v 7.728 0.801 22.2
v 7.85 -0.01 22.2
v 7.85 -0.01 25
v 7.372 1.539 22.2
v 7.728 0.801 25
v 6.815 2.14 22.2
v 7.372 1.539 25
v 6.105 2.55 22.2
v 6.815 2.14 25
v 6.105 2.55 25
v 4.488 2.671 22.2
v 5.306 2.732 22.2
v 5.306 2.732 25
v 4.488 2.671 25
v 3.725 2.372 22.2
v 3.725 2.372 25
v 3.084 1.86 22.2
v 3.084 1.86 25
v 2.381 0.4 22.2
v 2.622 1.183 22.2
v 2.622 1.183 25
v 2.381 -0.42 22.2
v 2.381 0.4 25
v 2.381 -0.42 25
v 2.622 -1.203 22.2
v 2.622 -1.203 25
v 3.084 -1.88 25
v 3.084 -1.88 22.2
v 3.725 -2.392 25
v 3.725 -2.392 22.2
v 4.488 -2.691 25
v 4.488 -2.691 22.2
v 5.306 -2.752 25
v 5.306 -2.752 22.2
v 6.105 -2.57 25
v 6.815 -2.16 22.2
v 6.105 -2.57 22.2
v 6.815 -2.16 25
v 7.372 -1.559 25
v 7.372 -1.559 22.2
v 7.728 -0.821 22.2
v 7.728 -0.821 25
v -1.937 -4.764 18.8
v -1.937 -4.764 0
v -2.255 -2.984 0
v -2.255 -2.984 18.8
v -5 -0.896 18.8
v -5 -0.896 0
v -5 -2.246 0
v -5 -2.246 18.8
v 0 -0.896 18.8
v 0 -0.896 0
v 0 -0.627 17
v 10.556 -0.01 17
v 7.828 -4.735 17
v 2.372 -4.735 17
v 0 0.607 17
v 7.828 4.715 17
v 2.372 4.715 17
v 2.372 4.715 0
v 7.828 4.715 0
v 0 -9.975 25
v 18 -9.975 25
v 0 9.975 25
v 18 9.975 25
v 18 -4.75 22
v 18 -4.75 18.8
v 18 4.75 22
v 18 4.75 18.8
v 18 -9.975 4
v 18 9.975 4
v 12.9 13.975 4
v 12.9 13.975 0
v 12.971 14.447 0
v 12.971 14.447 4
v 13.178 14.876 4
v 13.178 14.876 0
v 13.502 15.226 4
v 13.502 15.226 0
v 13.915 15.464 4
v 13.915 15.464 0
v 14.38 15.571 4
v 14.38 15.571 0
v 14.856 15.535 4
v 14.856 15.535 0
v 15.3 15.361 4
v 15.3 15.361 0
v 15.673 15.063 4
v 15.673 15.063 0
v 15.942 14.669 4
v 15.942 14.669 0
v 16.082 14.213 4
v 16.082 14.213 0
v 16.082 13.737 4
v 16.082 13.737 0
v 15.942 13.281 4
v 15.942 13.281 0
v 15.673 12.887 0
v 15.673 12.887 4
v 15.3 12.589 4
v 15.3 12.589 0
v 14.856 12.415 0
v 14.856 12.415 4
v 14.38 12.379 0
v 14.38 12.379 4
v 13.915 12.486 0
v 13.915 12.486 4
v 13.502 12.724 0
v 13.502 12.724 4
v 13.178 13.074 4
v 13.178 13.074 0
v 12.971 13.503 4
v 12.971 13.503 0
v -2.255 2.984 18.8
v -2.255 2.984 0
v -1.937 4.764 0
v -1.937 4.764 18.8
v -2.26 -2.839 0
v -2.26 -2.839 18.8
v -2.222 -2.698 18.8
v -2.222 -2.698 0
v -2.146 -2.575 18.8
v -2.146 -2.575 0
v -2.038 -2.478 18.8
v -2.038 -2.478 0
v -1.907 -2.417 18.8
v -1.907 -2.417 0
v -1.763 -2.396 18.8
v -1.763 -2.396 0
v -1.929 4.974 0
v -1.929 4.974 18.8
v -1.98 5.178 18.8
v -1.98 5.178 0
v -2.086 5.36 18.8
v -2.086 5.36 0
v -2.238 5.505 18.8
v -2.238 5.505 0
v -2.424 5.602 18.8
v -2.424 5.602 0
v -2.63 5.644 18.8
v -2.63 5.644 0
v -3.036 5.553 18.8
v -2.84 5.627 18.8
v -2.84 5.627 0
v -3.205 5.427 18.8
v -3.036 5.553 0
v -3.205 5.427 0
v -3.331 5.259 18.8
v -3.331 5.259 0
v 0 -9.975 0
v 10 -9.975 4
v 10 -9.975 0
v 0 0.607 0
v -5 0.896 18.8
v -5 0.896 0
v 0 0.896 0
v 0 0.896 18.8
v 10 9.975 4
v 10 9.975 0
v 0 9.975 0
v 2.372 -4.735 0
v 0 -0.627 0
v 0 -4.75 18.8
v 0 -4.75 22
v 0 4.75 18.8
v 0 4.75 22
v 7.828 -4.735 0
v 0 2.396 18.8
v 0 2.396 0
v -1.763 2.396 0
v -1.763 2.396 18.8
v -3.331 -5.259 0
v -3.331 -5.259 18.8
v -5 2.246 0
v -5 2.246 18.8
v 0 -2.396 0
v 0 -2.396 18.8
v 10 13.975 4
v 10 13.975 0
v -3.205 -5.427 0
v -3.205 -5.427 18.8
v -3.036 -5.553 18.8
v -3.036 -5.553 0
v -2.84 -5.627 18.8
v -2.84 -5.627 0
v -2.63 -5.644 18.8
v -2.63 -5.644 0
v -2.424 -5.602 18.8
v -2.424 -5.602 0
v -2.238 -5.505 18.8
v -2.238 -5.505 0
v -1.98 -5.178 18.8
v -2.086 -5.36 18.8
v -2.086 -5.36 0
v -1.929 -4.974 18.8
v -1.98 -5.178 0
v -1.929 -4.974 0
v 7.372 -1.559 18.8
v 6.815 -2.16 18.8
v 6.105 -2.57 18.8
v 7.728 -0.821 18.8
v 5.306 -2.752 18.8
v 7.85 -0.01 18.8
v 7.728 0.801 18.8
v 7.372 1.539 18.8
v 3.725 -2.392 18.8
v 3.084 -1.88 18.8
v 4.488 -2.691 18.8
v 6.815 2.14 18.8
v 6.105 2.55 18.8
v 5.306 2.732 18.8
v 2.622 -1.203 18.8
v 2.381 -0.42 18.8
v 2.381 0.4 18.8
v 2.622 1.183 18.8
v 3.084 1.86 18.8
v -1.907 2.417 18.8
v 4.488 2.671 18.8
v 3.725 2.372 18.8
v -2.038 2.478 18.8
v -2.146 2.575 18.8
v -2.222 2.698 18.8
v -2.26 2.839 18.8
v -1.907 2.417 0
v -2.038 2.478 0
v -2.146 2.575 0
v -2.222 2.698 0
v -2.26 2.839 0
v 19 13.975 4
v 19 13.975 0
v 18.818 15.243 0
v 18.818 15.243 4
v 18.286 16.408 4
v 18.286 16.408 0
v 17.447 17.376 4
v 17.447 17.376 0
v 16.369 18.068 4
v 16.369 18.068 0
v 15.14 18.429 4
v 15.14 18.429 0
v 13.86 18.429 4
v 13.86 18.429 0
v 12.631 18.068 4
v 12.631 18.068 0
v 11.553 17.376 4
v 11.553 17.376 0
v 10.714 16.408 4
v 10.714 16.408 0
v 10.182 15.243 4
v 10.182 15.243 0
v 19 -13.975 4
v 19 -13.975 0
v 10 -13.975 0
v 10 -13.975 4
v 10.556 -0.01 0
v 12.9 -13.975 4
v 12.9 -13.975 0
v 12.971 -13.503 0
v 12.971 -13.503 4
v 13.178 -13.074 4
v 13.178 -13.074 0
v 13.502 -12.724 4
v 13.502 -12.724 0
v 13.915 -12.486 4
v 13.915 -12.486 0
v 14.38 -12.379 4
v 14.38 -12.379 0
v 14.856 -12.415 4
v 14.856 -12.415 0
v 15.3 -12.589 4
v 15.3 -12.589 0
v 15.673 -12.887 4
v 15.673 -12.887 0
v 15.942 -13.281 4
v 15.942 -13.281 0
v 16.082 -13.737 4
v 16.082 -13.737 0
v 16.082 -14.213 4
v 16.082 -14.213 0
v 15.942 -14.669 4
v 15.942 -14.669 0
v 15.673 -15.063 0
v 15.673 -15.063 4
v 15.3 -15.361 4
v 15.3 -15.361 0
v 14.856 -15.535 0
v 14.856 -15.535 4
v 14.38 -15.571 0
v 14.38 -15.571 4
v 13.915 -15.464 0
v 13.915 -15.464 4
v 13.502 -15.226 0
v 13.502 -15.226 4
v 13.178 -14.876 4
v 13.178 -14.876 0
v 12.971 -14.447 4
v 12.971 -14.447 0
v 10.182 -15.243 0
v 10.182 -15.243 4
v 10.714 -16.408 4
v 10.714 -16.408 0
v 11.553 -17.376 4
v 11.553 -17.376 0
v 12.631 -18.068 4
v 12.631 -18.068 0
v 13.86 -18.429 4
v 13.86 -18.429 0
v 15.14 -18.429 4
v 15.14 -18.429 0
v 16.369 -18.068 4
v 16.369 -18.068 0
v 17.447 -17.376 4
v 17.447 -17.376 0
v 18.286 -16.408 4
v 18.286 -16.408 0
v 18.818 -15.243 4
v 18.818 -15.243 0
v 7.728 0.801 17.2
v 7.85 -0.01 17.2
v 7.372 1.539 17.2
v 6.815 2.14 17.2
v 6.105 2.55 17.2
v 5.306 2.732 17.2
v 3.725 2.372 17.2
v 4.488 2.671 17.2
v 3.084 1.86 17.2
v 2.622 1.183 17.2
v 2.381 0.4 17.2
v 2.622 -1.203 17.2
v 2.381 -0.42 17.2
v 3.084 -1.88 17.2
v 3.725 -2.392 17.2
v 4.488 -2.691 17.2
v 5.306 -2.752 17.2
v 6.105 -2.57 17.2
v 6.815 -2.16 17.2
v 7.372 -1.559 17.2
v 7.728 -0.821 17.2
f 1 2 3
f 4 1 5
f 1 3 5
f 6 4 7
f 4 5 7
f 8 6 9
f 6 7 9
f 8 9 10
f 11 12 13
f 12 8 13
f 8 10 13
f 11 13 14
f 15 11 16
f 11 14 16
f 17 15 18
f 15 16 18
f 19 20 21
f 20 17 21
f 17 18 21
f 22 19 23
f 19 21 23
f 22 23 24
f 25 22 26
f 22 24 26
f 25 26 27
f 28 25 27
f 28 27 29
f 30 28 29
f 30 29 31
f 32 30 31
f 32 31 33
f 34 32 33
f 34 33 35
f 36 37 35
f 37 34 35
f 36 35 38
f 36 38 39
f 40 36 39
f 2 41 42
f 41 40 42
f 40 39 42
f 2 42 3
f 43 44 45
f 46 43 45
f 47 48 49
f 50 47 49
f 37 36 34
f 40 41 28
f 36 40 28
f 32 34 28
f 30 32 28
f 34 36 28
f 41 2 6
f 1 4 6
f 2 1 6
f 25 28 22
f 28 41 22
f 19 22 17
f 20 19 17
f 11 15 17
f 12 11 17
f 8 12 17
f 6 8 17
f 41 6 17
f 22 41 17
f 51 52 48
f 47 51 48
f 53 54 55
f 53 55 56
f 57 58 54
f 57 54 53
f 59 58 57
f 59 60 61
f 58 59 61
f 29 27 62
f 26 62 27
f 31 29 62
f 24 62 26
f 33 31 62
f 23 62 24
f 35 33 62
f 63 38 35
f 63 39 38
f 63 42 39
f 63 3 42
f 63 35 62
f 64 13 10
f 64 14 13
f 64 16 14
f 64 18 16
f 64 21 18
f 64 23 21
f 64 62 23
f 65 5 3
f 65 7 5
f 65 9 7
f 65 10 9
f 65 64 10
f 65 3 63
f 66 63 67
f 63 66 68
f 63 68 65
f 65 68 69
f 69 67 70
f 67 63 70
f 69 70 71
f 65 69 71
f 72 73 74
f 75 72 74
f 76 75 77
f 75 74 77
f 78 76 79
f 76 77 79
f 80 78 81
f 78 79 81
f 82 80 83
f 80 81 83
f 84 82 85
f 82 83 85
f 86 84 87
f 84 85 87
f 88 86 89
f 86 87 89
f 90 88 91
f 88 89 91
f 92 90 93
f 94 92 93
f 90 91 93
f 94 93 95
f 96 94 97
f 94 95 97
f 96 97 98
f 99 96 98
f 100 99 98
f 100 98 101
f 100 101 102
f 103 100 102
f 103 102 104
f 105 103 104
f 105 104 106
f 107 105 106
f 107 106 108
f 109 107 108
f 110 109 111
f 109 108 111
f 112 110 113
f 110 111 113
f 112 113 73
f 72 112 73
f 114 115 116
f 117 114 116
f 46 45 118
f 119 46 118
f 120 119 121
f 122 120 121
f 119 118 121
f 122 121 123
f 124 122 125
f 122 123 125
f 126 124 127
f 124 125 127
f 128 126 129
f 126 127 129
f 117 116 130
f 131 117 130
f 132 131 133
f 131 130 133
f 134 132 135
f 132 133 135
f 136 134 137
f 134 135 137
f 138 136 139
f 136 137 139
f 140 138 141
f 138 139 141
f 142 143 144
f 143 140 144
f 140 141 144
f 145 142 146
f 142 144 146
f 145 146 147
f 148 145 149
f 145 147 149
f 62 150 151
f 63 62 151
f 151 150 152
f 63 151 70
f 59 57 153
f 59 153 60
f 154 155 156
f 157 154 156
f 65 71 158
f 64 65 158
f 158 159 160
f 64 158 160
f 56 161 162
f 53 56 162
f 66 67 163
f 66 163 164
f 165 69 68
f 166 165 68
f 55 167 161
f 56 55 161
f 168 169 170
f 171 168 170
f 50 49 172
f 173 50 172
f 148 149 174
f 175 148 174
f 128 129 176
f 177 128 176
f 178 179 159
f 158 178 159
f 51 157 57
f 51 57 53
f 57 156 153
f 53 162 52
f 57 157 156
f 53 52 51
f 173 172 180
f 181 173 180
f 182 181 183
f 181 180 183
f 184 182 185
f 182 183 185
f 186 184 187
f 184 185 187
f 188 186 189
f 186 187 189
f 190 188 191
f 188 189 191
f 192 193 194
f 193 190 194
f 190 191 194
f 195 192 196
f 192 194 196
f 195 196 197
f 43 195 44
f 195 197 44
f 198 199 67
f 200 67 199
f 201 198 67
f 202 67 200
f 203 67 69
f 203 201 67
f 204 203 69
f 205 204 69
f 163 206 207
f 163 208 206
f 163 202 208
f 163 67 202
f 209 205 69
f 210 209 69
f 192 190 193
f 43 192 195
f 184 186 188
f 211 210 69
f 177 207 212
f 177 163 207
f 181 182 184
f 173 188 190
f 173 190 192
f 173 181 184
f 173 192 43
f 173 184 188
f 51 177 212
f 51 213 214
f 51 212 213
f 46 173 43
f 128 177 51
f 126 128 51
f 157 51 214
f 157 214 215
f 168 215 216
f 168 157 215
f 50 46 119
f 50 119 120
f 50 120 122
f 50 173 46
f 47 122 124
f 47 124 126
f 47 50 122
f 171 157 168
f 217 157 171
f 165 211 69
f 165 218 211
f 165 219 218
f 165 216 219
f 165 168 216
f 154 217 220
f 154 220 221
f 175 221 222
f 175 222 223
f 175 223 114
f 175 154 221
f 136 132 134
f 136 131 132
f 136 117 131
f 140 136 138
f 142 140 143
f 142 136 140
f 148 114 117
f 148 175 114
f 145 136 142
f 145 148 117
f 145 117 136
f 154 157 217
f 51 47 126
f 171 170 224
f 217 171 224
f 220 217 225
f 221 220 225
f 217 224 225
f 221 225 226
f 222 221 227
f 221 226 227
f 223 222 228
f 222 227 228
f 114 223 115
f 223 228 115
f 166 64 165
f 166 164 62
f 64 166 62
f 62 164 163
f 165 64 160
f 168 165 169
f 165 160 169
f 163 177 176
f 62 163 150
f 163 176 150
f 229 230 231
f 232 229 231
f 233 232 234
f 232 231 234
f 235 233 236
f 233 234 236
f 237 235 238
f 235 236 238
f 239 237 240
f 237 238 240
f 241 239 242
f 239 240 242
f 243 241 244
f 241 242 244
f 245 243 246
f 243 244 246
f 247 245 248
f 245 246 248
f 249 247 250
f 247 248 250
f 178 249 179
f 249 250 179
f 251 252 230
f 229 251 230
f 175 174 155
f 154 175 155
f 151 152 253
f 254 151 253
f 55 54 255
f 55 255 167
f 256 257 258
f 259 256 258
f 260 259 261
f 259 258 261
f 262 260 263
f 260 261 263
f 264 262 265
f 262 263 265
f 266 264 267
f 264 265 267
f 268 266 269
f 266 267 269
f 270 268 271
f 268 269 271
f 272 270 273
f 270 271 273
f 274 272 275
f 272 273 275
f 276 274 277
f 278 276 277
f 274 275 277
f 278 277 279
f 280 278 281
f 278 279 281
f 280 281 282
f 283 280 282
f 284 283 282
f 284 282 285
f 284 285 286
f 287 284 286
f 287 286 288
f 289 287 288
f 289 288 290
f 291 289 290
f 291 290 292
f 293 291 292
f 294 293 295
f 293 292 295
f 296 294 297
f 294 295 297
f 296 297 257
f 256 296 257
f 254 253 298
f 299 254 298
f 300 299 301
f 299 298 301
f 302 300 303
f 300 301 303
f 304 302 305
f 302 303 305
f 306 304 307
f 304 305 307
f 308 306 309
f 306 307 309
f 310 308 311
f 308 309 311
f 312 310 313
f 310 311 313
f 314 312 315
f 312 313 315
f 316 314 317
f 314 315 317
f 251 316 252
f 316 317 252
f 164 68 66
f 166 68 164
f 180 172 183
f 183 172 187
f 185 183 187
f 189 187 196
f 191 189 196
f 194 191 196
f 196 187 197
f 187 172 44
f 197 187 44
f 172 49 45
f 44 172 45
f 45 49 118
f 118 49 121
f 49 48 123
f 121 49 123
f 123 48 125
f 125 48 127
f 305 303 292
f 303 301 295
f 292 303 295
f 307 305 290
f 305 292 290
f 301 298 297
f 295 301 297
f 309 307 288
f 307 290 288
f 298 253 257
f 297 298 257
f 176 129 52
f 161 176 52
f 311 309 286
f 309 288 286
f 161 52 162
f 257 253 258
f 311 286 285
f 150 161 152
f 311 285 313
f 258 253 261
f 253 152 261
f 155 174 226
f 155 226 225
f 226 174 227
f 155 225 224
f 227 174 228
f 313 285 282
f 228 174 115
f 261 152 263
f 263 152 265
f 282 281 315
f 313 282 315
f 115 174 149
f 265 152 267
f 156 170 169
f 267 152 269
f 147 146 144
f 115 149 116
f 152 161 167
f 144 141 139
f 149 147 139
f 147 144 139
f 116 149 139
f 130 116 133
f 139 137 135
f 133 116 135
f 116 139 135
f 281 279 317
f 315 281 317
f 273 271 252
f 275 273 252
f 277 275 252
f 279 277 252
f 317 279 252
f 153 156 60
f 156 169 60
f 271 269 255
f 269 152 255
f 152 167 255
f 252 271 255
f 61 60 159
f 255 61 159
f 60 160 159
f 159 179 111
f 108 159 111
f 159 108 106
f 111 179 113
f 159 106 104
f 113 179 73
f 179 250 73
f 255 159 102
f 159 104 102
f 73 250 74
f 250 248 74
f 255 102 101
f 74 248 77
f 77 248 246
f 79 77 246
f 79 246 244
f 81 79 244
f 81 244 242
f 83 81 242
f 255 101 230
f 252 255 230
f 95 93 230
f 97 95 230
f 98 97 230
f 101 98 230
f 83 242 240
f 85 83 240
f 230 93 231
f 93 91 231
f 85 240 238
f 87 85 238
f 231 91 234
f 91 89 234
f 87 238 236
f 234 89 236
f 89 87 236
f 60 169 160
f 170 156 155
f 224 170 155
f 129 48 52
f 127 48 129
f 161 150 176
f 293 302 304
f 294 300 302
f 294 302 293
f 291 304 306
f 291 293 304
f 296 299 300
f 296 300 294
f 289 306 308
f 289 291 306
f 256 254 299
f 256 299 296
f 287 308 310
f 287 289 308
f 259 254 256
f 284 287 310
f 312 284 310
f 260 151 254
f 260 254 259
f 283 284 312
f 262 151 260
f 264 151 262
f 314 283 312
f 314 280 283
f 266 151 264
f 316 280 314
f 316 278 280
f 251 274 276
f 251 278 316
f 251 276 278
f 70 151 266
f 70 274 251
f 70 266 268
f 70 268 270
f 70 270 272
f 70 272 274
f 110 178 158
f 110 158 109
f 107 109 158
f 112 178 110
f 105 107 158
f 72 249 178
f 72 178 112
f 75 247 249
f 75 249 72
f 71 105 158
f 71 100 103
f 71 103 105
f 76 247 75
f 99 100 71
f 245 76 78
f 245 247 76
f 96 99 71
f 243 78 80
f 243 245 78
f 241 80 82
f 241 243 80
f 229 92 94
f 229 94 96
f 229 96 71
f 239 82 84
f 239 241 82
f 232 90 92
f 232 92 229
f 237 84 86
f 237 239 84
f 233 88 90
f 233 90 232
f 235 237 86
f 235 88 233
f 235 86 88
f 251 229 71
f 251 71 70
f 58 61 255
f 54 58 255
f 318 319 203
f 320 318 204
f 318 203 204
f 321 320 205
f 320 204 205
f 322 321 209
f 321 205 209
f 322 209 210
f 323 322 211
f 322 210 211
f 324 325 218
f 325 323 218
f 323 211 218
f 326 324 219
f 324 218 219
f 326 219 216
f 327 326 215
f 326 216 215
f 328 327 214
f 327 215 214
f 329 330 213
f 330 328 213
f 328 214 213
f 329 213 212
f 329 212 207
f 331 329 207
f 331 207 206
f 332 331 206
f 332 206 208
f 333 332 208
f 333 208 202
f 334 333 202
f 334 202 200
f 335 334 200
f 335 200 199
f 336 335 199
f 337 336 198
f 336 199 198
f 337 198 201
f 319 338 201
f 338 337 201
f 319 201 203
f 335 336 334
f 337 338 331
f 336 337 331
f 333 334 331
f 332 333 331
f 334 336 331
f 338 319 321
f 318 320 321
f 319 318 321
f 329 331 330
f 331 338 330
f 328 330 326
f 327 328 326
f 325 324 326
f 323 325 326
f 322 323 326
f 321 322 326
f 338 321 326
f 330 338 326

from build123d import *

# Parameters (mm, degrees)
BOSS_EXTRUDE1_DEPTH = 25
SKETCH2_W           = 3.2
SKETCH2_H           = 9.5
CUT_EXTRUDE1_DEPTH  = 55.5
SKETCH3_R           = 2.75
CUT_EXTRUDE2_DEPTH  = 37
CUT_EXTRUDE3_DEPTH  = 17
SKETCH9_W           = 6.2
SKETCH9_H           = 19.95
CUT_EXTRUDE8_DEPTH  = 18
SKETCH10_R          = 2.75
BOSS_EXTRUDE2_DEPTH = 0.2
SKETCH11_R          = 2.75
BOSS_EXTRUDE3_DEPTH = 0.2
SKETCH12_R          = 1.6
BOSS_EXTRUDE4_DEPTH = 4


with BuildPart() as part:
    # Sketch1 → Boss-Extrude1 (new body)
    with BuildSketch(Plane.XY):
        with BuildLine():
            Line((0, 2.395761144), (-1.762956434, 2.395761144))
            ThreePointArc((-1.762956434, 2.395761144), (-2.146371288, 2.574835842), (-2.255146546, 2.983788945))
            Line((-2.255146546, 2.983788945), (-1.936807424, 4.763719442))
            ThreePointArc((-1.936807424, 4.763719442), (-2.424010325, 5.602484354), (-3.331198308, 5.259113989))
            Line((-3.331198308, 5.259113989), (-5, 2.245761144))
            Line((-5, 2.245761144), (-5, 0.895761144))
            Line((-5, 0.895761144), (0, 0.895761144))
            Line((0, 0.895761144), (0, -0.895761144))
            Line((0, -0.895761144), (-5, -0.895761144))
            Line((-5, -0.895761144), (-5, -2.245761144))
            Line((-5, -2.245761144), (-3.331198308, -5.259113989))
            ThreePointArc((-3.331198308, -5.259113989), (-2.424010325, -5.602484354), (-1.936807424, -4.763719442))
            Line((-1.936807424, -4.763719442), (-2.255146546, -2.983788945))
            ThreePointArc((-2.255146546, -2.983788945), (-2.146371288, -2.574835842), (-1.762956434, -2.395761144))
            Line((-1.762956434, -2.395761144), (0, -2.395761144))
            Line((0, -2.395761144), (0, -9.975))
            Line((0, -9.975), (18, -9.975))
            Line((18, -9.975), (18, 9.975))
            Line((18, 9.975), (0, 9.975))
            Line((0, 9.975), (0, 2.395761144))
        make_face()
    extrude(amount=BOSS_EXTRUDE1_DEPTH)

    # Sketch2 → Cut-Extrude1 (cut, symmetric)
    with BuildSketch(Plane.ZY):
        with Locations((20.4, 0)):
            Rectangle(SKETCH2_W, SKETCH2_H)
    extrude(amount=CUT_EXTRUDE1_DEPTH, both=True, mode=Mode.SUBTRACT)

    # Sketch3 → Cut-Extrude2 (cut)
    with BuildSketch(Plane.XY.offset(25)):
        with Locations((5.1, -0.01)):
            Circle(SKETCH3_R)
    extrude(amount=-CUT_EXTRUDE2_DEPTH, mode=Mode.SUBTRACT)

    # Sketch4 → Cut-Extrude3 (cut)
    with BuildSketch(Plane(origin=(0, 0, 0), x_dir=(-1, 0, 0), z_dir=(0, 0, -1))):
        Polygon((-10.555960044, -0.01), (-7.827980022, -4.735), (-2.372019978, -4.735), (0.355960044, -0.01), (-2.372019978, 4.715), (-7.827980022, 4.715), align=None)
    extrude(amount=-CUT_EXTRUDE3_DEPTH, mode=Mode.SUBTRACT)

    # Sketch9 → Cut-Extrude8 (cut)
    with BuildSketch(Plane.ZY):
        with Locations((21.9, 0)):
            Rectangle(SKETCH9_W, SKETCH9_H)
    extrude(amount=CUT_EXTRUDE8_DEPTH, mode=Mode.SUBTRACT)

    # Sketch10 → Boss-Extrude2 (add)
    with BuildSketch(Plane(origin=(0, 0, 17), x_dir=(-1, 0, 0), z_dir=(0, 0, -1))):
        with Locations((-5.1, -0.01)):
            Circle(SKETCH10_R)
    extrude(amount=-BOSS_EXTRUDE2_DEPTH)

    # Sketch11 → Boss-Extrude3 (add)
    with BuildSketch(Plane(origin=(0, 0, 22), x_dir=(-1, 0, 0), z_dir=(0, 0, -1))):
        with Locations((-5.1, -0.01)):
            Circle(SKETCH11_R)
    extrude(amount=-BOSS_EXTRUDE3_DEPTH)

    # Sketch12 → Boss-Extrude4 (add)
    with BuildSketch(Plane(origin=(0, 0, 0), x_dir=(-1, 0, 0), z_dir=(0, 0, -1))):
        with BuildLine():
            Line((-10, 4.48373582), (-12, 0))
            Line((-12, 0), (-10, -4.48373582))
            Line((-10, -4.48373582), (-10, -13.975))
            ThreePointArc((-10, -13.975), (-14.5, -18.475), (-19, -13.975))
            Line((-19, -13.975), (-19, 13.975))
            ThreePointArc((-19, 13.975), (-14.5, 18.475), (-10, 13.975))
            Line((-10, 13.975), (-10, 4.48373582))
        make_face()
        with Locations((-14.5, -13.975)):
            Circle(SKETCH12_R, mode=Mode.SUBTRACT)
        with Locations((-14.5, 13.975)):
            Circle(SKETCH12_R, mode=Mode.SUBTRACT)
    extrude(amount=-BOSS_EXTRUDE4_DEPTH)


solid = part.part
